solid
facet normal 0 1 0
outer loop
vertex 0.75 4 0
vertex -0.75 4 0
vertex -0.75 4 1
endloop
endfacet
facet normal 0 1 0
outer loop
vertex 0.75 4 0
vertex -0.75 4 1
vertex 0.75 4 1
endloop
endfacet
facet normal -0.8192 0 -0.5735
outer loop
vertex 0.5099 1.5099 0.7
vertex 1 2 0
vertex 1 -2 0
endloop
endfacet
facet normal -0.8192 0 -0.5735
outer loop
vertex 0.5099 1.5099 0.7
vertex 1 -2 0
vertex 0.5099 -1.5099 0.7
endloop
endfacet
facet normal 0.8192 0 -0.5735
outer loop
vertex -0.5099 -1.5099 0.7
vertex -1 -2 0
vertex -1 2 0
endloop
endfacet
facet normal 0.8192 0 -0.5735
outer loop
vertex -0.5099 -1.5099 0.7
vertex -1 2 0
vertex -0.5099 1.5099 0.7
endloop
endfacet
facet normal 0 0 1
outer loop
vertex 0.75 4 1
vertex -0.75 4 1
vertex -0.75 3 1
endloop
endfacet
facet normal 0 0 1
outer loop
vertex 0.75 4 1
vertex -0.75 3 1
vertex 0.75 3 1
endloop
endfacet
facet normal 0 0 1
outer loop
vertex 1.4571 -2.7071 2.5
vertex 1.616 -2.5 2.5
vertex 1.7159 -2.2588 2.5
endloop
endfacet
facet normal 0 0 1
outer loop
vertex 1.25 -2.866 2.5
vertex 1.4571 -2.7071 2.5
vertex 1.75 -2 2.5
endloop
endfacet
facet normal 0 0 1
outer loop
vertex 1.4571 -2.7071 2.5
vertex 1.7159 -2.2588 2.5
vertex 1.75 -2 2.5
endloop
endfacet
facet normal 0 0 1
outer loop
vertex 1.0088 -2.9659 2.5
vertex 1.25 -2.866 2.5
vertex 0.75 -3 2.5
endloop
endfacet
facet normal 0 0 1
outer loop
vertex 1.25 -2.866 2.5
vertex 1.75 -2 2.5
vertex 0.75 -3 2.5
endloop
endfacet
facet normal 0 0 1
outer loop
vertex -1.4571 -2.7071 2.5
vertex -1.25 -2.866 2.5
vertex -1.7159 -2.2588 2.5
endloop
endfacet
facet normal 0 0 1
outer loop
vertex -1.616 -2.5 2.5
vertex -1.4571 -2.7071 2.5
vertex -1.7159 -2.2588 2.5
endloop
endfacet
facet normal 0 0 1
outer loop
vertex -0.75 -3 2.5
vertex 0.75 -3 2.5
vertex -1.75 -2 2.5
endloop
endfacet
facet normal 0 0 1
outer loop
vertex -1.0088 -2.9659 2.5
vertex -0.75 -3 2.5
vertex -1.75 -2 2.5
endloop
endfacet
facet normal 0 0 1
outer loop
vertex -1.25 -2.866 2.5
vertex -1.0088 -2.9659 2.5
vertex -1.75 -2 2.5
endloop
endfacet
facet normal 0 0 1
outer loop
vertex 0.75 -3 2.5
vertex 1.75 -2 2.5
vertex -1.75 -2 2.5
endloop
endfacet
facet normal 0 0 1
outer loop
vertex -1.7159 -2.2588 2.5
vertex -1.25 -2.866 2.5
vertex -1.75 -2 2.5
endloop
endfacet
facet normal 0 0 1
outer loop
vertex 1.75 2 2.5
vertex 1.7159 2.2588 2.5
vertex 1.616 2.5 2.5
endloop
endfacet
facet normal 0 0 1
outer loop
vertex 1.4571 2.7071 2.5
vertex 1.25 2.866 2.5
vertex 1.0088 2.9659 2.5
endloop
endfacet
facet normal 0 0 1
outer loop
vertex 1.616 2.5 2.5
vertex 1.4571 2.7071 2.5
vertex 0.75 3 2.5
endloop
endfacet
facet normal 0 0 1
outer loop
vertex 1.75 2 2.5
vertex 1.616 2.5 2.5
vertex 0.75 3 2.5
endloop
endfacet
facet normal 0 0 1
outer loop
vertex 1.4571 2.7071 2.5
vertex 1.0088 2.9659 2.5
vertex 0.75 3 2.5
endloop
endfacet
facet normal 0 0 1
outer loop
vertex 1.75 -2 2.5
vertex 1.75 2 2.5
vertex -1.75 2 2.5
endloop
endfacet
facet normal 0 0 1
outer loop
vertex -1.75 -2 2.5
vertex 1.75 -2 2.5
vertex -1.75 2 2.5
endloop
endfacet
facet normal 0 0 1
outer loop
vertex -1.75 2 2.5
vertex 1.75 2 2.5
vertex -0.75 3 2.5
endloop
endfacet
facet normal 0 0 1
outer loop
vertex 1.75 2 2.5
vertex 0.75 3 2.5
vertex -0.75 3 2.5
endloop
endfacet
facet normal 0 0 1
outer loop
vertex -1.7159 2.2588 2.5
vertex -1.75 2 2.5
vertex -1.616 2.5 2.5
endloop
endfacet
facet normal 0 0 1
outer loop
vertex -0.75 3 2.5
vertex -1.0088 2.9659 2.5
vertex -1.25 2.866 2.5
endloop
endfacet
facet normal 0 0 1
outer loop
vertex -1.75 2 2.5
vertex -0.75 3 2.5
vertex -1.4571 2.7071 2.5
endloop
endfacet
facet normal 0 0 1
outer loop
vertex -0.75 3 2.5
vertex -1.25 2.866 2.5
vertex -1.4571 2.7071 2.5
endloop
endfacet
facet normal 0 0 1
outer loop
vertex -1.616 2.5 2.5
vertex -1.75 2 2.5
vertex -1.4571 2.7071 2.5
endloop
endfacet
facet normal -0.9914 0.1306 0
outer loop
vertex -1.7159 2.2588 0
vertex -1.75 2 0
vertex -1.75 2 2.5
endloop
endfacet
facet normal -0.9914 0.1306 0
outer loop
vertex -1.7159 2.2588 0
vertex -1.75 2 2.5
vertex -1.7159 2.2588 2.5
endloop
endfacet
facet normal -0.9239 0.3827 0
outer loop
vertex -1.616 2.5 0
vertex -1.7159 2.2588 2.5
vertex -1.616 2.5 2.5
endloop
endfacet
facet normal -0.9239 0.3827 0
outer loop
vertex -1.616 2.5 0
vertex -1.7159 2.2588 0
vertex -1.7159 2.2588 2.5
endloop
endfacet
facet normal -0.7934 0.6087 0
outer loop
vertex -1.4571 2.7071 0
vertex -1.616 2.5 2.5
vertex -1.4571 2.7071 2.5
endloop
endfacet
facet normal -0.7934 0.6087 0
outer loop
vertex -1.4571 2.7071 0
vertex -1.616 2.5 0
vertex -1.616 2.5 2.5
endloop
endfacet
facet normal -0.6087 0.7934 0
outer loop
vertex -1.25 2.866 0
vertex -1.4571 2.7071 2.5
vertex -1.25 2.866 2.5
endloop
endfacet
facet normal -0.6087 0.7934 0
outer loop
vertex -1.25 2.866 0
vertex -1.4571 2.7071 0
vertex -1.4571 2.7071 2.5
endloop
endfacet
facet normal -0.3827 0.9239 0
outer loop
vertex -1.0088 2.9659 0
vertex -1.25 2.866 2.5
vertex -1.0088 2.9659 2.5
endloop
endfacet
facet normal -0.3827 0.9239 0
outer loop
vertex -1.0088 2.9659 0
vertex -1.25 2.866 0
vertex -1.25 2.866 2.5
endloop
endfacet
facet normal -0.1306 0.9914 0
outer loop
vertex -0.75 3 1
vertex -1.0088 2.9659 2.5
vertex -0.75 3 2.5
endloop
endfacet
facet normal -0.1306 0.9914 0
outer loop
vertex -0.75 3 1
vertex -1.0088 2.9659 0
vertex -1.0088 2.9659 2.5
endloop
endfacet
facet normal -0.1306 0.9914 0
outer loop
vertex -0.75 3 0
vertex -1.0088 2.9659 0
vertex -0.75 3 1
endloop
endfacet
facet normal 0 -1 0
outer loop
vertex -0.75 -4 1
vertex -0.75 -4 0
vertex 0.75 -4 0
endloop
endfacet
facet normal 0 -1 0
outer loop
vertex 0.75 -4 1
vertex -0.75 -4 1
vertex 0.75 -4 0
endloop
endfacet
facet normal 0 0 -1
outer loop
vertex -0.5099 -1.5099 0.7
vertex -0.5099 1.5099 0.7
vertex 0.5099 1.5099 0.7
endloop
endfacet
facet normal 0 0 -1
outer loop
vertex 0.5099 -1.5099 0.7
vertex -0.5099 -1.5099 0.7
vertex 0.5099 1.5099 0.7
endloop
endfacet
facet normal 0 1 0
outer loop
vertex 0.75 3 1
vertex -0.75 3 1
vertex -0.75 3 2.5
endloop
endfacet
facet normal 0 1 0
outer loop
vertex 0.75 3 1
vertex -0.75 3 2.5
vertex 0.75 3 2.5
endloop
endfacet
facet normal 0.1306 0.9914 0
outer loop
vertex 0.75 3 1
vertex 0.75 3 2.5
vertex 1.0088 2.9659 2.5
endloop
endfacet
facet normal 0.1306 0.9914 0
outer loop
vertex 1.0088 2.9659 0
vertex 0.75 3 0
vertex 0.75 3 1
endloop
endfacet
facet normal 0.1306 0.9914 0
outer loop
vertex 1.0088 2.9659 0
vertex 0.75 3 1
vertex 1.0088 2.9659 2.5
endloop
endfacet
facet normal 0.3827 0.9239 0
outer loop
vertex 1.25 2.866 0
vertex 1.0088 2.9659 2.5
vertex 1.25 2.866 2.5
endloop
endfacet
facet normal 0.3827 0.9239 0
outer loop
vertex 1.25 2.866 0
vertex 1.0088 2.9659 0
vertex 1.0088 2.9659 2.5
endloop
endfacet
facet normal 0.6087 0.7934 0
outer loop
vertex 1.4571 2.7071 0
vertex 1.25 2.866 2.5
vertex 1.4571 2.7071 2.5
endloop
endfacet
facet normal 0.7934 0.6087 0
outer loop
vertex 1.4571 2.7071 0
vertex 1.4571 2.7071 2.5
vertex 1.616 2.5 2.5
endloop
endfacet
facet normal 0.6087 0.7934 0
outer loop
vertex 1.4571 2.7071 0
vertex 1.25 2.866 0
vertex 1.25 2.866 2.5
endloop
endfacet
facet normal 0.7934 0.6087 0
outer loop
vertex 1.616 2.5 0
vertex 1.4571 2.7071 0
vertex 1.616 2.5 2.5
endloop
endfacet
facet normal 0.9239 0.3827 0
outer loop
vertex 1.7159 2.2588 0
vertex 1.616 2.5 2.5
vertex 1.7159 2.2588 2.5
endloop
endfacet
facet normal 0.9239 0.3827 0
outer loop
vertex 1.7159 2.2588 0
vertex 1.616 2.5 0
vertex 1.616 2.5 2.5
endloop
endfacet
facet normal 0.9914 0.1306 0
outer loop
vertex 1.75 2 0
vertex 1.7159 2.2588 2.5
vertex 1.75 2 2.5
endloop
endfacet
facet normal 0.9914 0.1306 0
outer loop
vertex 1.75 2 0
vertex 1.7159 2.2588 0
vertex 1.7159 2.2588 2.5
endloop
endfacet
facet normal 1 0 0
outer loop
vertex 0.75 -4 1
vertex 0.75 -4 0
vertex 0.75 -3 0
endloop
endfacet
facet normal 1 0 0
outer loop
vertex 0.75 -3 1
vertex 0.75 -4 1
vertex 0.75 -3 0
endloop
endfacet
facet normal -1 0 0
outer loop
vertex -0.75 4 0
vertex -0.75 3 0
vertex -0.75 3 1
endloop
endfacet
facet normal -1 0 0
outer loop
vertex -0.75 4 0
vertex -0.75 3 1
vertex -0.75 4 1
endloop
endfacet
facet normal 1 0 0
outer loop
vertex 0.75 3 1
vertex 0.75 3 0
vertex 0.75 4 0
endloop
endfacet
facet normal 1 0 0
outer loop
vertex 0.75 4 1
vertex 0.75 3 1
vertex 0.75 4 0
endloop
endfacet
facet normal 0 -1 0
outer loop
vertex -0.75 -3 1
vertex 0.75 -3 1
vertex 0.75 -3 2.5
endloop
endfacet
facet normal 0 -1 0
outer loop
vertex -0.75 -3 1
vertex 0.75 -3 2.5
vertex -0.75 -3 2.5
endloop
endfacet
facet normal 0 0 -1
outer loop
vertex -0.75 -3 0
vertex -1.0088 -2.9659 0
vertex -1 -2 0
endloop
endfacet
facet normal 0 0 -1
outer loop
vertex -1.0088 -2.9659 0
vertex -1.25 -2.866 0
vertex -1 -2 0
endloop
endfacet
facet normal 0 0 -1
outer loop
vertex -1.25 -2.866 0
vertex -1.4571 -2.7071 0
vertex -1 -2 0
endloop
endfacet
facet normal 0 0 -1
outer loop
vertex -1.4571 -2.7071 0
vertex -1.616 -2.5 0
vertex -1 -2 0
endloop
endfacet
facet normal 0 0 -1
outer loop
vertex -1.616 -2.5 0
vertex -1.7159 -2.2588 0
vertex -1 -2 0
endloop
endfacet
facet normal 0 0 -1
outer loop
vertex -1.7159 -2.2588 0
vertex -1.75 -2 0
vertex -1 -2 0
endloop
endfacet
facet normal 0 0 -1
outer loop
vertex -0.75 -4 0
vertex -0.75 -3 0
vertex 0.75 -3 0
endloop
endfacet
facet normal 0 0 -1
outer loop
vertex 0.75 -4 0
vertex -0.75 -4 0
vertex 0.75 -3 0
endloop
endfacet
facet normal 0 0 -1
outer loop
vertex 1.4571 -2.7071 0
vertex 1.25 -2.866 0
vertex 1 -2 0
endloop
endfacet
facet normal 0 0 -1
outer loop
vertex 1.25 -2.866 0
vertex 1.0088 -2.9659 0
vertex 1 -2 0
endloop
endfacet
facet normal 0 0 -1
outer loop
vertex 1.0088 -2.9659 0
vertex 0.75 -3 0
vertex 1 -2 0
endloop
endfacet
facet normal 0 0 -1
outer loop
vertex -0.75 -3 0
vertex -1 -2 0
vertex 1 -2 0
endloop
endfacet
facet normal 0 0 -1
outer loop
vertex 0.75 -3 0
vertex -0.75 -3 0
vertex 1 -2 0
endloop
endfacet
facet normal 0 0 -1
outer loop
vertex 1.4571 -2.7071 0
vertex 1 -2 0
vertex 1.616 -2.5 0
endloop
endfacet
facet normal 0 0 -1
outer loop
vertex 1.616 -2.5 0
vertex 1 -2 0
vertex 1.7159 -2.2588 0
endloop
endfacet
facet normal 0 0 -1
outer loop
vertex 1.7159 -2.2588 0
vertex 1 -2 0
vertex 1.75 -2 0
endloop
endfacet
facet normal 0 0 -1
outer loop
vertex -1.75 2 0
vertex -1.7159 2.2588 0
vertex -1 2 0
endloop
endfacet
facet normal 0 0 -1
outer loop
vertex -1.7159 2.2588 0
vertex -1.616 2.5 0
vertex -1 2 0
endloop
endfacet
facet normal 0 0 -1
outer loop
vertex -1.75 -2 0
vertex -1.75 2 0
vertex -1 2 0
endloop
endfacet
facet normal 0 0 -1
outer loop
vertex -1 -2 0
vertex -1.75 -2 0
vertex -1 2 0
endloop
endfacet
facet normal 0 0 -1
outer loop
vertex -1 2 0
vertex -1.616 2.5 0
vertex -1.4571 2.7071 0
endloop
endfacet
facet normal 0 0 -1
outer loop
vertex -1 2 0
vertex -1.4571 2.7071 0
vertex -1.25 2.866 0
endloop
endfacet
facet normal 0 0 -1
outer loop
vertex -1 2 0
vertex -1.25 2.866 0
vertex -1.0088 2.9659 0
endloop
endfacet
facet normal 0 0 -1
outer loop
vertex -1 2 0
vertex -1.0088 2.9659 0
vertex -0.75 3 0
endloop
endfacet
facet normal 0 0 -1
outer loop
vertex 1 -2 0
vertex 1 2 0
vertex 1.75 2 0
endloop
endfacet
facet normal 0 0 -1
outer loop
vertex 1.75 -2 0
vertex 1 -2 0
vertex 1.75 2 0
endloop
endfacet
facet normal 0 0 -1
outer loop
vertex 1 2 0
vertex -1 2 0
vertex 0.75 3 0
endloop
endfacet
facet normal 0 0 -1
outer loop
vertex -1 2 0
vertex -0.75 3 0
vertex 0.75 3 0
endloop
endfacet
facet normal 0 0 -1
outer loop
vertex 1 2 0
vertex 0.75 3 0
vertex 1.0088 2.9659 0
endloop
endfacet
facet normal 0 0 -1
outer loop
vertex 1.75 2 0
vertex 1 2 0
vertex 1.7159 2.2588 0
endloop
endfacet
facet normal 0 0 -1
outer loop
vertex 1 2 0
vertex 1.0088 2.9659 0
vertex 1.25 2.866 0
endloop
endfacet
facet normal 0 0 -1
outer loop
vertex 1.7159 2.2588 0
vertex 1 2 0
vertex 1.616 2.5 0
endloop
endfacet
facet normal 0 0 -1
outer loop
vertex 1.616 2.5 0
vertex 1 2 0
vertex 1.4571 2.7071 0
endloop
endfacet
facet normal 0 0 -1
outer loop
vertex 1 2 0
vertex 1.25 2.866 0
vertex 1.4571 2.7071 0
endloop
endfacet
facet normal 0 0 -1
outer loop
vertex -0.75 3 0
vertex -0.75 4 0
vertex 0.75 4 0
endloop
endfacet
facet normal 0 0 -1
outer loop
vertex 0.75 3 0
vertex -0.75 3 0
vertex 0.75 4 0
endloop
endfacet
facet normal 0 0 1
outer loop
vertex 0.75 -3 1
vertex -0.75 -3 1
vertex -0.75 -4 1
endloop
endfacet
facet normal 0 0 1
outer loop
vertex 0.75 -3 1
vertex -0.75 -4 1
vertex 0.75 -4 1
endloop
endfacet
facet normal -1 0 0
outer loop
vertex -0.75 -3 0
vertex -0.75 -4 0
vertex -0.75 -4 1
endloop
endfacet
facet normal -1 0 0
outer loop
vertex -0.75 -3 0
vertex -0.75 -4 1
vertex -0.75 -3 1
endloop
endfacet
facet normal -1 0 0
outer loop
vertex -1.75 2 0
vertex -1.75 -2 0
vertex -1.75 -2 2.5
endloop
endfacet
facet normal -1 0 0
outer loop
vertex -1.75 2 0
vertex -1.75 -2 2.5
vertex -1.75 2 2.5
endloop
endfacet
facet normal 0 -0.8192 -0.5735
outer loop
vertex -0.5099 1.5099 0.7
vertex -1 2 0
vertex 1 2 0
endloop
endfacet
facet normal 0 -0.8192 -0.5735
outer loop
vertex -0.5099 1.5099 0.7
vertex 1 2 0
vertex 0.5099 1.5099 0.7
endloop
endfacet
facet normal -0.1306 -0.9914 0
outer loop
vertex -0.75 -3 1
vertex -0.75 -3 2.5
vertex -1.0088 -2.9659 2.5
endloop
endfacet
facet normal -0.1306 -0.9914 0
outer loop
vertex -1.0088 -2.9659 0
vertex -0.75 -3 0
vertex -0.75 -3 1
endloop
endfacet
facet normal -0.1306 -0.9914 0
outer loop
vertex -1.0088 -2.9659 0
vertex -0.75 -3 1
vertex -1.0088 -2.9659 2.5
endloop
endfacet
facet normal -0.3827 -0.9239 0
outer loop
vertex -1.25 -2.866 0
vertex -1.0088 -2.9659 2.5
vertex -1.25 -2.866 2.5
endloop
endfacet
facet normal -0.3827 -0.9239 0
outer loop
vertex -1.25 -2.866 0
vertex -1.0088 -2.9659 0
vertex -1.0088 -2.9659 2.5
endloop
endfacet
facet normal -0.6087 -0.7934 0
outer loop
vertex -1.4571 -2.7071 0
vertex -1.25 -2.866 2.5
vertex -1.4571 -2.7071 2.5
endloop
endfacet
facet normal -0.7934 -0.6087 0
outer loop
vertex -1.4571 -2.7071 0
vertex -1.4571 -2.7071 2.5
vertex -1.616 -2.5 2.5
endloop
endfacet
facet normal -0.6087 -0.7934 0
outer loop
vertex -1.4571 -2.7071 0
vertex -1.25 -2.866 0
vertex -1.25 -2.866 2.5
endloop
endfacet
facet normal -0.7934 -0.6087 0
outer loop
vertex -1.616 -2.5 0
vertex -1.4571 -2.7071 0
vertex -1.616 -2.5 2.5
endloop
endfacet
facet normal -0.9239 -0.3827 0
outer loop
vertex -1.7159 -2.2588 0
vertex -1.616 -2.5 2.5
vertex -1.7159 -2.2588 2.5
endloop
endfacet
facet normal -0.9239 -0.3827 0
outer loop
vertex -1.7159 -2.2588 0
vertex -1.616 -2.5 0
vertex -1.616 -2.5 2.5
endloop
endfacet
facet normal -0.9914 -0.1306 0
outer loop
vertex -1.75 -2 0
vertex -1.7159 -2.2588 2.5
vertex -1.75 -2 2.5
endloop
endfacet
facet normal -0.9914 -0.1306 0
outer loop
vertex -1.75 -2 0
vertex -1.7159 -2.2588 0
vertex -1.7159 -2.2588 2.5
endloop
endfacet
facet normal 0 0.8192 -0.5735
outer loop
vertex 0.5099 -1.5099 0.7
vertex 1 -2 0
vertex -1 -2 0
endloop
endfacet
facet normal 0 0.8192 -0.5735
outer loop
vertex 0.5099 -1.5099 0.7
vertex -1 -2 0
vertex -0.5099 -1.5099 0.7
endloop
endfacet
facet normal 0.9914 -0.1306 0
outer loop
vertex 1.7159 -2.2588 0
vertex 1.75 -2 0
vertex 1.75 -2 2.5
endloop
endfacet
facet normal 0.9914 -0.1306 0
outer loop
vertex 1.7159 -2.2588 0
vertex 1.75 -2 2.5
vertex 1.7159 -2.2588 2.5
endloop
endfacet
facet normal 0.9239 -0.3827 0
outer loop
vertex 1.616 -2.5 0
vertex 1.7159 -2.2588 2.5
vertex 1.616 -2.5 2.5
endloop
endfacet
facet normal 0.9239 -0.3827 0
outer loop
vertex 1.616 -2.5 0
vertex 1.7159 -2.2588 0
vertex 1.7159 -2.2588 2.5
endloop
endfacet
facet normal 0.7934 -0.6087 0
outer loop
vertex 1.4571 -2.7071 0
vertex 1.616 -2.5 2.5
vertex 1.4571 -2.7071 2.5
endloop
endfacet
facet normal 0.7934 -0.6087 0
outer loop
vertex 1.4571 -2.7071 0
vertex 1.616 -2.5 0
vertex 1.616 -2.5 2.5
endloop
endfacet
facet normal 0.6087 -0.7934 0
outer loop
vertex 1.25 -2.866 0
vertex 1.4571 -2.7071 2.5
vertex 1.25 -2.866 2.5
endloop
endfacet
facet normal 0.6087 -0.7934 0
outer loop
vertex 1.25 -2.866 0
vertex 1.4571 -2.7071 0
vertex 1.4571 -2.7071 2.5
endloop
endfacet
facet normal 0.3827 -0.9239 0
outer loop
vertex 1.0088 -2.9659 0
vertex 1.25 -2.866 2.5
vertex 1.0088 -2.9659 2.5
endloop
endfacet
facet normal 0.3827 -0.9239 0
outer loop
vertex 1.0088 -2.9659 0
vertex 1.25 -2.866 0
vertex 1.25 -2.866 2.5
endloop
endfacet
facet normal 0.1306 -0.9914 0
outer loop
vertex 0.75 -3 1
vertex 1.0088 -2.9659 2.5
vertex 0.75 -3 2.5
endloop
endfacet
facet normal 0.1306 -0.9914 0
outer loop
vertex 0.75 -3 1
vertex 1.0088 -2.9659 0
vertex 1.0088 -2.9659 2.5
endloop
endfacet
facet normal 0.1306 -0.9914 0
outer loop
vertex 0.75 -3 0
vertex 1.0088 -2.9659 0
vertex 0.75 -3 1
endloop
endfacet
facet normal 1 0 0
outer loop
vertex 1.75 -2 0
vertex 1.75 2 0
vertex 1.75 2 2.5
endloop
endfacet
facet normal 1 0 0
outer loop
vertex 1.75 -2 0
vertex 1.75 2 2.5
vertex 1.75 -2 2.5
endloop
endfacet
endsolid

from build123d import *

# Parameters (mm, degrees)
SKETCH_1_W          = 2
SKETCH_1_H          = 4
EXTRUDE_1_DEPTH     = 2.5
SKETCH_1_3_W        = 1.5
SKETCH_1_3_H        = 1
EXTRUDE_2_DEPTH     = 1
SKETCH_1_4_W        = 2
SKETCH_1_4_H        = 4
CUT_EXTRUDE_1_DEPTH = 0.7
CHAMFER_1_SIZE      = 0.7
CHAMFER_1_SIZE_2    = 0.490145277


with BuildPart() as part:
    # 草图1 → 凸台-拉伸1 (new body)
    # profile 1 of 2: a face of its own
    with BuildSketch(Plane.XY):
        with BuildLine():
            ThreePointArc((0.75, 3), (1.457106781, 2.707106781), (1.75, 2))
            Line((1.75, 2), (1.75, -2))
            ThreePointArc((1.75, -2), (1.457106781, -2.707106781), (0.75, -3))
            Line((0.75, -3), (-0.75, -3))
            ThreePointArc((-0.75, -3), (-1.457106781, -2.707106781), (-1.75, -2))
            Line((-1.75, -2), (-1.75, 2))
            ThreePointArc((-1.75, 2), (-1.457106781, 2.707106781), (-0.75, 3))
            Line((-0.75, 3), (0.75, 3))
        make_face()
        Rectangle(SKETCH_1_W, SKETCH_1_H, mode=Mode.SUBTRACT)
    # profile 2 of 2: a face of its own
    with BuildSketch(Plane.XY):
        Rectangle(SKETCH_1_W, SKETCH_1_H)
    extrude(amount=EXTRUDE_1_DEPTH)

    # 草图1<3> → 凸台-拉伸2 (add)
    with BuildSketch(Plane.XY):
        with Locations((0, 3.5)):
            Rectangle(SKETCH_1_3_W, SKETCH_1_3_H)
        with Locations((0, -3.5)):
            Rectangle(SKETCH_1_3_W, SKETCH_1_3_H)
    extrude(amount=EXTRUDE_2_DEPTH)

    # 草图1<4> → 切除-拉伸1 (cut)
    with BuildSketch(Plane.XY):
        Rectangle(SKETCH_1_4_W, SKETCH_1_4_H)
    extrude(amount=CUT_EXTRUDE_1_DEPTH, mode=Mode.SUBTRACT)

    # 倒角1
    # the kernel refuses this chamfer: 0.7, 0.490145277 mm, written as the material it adds along each edge
    with BuildSketch(Plane(origin=(1, -2, 0.7), x_dir=(0, -0.02220967419845705, -0.99975333476413), z_dir=(-1, 0, 0)), Plane(origin=(-1, 2, 0.7), x_dir=(0, 0.02220967419845705, -0.99975333476413), z_dir=(1, 0, 0))) as chamfer_1_piece_1:
        Polygon((CHAMFER_1_SIZE * 0.999753334764, -CHAMFER_1_SIZE * 0.0222096741985), (-CHAMFER_1_SIZE_2 * 0.022209674187, -CHAMFER_1_SIZE_2 * 0.999753334248), (0, 0), align=None)
    extrude(amount=2)
    with BuildSketch(Plane(origin=(-1, -2, 0.7), x_dir=(-0.02220967419845705, 0, -0.99975333476413), z_dir=(0, 1, 0)), Plane(origin=(1, 2, 0.7), x_dir=(0.02220967419845705, 0, -0.99975333476413), z_dir=(0, -1, 0))) as chamfer_1_piece_2:
        Polygon((CHAMFER_1_SIZE * 0.999753334764, -CHAMFER_1_SIZE * 0.0222096741985), (-CHAMFER_1_SIZE_2 * 0.022209674187, -CHAMFER_1_SIZE_2 * 0.999753334248), (0, 0), align=None)
    extrude(amount=4)


solid = part.part
